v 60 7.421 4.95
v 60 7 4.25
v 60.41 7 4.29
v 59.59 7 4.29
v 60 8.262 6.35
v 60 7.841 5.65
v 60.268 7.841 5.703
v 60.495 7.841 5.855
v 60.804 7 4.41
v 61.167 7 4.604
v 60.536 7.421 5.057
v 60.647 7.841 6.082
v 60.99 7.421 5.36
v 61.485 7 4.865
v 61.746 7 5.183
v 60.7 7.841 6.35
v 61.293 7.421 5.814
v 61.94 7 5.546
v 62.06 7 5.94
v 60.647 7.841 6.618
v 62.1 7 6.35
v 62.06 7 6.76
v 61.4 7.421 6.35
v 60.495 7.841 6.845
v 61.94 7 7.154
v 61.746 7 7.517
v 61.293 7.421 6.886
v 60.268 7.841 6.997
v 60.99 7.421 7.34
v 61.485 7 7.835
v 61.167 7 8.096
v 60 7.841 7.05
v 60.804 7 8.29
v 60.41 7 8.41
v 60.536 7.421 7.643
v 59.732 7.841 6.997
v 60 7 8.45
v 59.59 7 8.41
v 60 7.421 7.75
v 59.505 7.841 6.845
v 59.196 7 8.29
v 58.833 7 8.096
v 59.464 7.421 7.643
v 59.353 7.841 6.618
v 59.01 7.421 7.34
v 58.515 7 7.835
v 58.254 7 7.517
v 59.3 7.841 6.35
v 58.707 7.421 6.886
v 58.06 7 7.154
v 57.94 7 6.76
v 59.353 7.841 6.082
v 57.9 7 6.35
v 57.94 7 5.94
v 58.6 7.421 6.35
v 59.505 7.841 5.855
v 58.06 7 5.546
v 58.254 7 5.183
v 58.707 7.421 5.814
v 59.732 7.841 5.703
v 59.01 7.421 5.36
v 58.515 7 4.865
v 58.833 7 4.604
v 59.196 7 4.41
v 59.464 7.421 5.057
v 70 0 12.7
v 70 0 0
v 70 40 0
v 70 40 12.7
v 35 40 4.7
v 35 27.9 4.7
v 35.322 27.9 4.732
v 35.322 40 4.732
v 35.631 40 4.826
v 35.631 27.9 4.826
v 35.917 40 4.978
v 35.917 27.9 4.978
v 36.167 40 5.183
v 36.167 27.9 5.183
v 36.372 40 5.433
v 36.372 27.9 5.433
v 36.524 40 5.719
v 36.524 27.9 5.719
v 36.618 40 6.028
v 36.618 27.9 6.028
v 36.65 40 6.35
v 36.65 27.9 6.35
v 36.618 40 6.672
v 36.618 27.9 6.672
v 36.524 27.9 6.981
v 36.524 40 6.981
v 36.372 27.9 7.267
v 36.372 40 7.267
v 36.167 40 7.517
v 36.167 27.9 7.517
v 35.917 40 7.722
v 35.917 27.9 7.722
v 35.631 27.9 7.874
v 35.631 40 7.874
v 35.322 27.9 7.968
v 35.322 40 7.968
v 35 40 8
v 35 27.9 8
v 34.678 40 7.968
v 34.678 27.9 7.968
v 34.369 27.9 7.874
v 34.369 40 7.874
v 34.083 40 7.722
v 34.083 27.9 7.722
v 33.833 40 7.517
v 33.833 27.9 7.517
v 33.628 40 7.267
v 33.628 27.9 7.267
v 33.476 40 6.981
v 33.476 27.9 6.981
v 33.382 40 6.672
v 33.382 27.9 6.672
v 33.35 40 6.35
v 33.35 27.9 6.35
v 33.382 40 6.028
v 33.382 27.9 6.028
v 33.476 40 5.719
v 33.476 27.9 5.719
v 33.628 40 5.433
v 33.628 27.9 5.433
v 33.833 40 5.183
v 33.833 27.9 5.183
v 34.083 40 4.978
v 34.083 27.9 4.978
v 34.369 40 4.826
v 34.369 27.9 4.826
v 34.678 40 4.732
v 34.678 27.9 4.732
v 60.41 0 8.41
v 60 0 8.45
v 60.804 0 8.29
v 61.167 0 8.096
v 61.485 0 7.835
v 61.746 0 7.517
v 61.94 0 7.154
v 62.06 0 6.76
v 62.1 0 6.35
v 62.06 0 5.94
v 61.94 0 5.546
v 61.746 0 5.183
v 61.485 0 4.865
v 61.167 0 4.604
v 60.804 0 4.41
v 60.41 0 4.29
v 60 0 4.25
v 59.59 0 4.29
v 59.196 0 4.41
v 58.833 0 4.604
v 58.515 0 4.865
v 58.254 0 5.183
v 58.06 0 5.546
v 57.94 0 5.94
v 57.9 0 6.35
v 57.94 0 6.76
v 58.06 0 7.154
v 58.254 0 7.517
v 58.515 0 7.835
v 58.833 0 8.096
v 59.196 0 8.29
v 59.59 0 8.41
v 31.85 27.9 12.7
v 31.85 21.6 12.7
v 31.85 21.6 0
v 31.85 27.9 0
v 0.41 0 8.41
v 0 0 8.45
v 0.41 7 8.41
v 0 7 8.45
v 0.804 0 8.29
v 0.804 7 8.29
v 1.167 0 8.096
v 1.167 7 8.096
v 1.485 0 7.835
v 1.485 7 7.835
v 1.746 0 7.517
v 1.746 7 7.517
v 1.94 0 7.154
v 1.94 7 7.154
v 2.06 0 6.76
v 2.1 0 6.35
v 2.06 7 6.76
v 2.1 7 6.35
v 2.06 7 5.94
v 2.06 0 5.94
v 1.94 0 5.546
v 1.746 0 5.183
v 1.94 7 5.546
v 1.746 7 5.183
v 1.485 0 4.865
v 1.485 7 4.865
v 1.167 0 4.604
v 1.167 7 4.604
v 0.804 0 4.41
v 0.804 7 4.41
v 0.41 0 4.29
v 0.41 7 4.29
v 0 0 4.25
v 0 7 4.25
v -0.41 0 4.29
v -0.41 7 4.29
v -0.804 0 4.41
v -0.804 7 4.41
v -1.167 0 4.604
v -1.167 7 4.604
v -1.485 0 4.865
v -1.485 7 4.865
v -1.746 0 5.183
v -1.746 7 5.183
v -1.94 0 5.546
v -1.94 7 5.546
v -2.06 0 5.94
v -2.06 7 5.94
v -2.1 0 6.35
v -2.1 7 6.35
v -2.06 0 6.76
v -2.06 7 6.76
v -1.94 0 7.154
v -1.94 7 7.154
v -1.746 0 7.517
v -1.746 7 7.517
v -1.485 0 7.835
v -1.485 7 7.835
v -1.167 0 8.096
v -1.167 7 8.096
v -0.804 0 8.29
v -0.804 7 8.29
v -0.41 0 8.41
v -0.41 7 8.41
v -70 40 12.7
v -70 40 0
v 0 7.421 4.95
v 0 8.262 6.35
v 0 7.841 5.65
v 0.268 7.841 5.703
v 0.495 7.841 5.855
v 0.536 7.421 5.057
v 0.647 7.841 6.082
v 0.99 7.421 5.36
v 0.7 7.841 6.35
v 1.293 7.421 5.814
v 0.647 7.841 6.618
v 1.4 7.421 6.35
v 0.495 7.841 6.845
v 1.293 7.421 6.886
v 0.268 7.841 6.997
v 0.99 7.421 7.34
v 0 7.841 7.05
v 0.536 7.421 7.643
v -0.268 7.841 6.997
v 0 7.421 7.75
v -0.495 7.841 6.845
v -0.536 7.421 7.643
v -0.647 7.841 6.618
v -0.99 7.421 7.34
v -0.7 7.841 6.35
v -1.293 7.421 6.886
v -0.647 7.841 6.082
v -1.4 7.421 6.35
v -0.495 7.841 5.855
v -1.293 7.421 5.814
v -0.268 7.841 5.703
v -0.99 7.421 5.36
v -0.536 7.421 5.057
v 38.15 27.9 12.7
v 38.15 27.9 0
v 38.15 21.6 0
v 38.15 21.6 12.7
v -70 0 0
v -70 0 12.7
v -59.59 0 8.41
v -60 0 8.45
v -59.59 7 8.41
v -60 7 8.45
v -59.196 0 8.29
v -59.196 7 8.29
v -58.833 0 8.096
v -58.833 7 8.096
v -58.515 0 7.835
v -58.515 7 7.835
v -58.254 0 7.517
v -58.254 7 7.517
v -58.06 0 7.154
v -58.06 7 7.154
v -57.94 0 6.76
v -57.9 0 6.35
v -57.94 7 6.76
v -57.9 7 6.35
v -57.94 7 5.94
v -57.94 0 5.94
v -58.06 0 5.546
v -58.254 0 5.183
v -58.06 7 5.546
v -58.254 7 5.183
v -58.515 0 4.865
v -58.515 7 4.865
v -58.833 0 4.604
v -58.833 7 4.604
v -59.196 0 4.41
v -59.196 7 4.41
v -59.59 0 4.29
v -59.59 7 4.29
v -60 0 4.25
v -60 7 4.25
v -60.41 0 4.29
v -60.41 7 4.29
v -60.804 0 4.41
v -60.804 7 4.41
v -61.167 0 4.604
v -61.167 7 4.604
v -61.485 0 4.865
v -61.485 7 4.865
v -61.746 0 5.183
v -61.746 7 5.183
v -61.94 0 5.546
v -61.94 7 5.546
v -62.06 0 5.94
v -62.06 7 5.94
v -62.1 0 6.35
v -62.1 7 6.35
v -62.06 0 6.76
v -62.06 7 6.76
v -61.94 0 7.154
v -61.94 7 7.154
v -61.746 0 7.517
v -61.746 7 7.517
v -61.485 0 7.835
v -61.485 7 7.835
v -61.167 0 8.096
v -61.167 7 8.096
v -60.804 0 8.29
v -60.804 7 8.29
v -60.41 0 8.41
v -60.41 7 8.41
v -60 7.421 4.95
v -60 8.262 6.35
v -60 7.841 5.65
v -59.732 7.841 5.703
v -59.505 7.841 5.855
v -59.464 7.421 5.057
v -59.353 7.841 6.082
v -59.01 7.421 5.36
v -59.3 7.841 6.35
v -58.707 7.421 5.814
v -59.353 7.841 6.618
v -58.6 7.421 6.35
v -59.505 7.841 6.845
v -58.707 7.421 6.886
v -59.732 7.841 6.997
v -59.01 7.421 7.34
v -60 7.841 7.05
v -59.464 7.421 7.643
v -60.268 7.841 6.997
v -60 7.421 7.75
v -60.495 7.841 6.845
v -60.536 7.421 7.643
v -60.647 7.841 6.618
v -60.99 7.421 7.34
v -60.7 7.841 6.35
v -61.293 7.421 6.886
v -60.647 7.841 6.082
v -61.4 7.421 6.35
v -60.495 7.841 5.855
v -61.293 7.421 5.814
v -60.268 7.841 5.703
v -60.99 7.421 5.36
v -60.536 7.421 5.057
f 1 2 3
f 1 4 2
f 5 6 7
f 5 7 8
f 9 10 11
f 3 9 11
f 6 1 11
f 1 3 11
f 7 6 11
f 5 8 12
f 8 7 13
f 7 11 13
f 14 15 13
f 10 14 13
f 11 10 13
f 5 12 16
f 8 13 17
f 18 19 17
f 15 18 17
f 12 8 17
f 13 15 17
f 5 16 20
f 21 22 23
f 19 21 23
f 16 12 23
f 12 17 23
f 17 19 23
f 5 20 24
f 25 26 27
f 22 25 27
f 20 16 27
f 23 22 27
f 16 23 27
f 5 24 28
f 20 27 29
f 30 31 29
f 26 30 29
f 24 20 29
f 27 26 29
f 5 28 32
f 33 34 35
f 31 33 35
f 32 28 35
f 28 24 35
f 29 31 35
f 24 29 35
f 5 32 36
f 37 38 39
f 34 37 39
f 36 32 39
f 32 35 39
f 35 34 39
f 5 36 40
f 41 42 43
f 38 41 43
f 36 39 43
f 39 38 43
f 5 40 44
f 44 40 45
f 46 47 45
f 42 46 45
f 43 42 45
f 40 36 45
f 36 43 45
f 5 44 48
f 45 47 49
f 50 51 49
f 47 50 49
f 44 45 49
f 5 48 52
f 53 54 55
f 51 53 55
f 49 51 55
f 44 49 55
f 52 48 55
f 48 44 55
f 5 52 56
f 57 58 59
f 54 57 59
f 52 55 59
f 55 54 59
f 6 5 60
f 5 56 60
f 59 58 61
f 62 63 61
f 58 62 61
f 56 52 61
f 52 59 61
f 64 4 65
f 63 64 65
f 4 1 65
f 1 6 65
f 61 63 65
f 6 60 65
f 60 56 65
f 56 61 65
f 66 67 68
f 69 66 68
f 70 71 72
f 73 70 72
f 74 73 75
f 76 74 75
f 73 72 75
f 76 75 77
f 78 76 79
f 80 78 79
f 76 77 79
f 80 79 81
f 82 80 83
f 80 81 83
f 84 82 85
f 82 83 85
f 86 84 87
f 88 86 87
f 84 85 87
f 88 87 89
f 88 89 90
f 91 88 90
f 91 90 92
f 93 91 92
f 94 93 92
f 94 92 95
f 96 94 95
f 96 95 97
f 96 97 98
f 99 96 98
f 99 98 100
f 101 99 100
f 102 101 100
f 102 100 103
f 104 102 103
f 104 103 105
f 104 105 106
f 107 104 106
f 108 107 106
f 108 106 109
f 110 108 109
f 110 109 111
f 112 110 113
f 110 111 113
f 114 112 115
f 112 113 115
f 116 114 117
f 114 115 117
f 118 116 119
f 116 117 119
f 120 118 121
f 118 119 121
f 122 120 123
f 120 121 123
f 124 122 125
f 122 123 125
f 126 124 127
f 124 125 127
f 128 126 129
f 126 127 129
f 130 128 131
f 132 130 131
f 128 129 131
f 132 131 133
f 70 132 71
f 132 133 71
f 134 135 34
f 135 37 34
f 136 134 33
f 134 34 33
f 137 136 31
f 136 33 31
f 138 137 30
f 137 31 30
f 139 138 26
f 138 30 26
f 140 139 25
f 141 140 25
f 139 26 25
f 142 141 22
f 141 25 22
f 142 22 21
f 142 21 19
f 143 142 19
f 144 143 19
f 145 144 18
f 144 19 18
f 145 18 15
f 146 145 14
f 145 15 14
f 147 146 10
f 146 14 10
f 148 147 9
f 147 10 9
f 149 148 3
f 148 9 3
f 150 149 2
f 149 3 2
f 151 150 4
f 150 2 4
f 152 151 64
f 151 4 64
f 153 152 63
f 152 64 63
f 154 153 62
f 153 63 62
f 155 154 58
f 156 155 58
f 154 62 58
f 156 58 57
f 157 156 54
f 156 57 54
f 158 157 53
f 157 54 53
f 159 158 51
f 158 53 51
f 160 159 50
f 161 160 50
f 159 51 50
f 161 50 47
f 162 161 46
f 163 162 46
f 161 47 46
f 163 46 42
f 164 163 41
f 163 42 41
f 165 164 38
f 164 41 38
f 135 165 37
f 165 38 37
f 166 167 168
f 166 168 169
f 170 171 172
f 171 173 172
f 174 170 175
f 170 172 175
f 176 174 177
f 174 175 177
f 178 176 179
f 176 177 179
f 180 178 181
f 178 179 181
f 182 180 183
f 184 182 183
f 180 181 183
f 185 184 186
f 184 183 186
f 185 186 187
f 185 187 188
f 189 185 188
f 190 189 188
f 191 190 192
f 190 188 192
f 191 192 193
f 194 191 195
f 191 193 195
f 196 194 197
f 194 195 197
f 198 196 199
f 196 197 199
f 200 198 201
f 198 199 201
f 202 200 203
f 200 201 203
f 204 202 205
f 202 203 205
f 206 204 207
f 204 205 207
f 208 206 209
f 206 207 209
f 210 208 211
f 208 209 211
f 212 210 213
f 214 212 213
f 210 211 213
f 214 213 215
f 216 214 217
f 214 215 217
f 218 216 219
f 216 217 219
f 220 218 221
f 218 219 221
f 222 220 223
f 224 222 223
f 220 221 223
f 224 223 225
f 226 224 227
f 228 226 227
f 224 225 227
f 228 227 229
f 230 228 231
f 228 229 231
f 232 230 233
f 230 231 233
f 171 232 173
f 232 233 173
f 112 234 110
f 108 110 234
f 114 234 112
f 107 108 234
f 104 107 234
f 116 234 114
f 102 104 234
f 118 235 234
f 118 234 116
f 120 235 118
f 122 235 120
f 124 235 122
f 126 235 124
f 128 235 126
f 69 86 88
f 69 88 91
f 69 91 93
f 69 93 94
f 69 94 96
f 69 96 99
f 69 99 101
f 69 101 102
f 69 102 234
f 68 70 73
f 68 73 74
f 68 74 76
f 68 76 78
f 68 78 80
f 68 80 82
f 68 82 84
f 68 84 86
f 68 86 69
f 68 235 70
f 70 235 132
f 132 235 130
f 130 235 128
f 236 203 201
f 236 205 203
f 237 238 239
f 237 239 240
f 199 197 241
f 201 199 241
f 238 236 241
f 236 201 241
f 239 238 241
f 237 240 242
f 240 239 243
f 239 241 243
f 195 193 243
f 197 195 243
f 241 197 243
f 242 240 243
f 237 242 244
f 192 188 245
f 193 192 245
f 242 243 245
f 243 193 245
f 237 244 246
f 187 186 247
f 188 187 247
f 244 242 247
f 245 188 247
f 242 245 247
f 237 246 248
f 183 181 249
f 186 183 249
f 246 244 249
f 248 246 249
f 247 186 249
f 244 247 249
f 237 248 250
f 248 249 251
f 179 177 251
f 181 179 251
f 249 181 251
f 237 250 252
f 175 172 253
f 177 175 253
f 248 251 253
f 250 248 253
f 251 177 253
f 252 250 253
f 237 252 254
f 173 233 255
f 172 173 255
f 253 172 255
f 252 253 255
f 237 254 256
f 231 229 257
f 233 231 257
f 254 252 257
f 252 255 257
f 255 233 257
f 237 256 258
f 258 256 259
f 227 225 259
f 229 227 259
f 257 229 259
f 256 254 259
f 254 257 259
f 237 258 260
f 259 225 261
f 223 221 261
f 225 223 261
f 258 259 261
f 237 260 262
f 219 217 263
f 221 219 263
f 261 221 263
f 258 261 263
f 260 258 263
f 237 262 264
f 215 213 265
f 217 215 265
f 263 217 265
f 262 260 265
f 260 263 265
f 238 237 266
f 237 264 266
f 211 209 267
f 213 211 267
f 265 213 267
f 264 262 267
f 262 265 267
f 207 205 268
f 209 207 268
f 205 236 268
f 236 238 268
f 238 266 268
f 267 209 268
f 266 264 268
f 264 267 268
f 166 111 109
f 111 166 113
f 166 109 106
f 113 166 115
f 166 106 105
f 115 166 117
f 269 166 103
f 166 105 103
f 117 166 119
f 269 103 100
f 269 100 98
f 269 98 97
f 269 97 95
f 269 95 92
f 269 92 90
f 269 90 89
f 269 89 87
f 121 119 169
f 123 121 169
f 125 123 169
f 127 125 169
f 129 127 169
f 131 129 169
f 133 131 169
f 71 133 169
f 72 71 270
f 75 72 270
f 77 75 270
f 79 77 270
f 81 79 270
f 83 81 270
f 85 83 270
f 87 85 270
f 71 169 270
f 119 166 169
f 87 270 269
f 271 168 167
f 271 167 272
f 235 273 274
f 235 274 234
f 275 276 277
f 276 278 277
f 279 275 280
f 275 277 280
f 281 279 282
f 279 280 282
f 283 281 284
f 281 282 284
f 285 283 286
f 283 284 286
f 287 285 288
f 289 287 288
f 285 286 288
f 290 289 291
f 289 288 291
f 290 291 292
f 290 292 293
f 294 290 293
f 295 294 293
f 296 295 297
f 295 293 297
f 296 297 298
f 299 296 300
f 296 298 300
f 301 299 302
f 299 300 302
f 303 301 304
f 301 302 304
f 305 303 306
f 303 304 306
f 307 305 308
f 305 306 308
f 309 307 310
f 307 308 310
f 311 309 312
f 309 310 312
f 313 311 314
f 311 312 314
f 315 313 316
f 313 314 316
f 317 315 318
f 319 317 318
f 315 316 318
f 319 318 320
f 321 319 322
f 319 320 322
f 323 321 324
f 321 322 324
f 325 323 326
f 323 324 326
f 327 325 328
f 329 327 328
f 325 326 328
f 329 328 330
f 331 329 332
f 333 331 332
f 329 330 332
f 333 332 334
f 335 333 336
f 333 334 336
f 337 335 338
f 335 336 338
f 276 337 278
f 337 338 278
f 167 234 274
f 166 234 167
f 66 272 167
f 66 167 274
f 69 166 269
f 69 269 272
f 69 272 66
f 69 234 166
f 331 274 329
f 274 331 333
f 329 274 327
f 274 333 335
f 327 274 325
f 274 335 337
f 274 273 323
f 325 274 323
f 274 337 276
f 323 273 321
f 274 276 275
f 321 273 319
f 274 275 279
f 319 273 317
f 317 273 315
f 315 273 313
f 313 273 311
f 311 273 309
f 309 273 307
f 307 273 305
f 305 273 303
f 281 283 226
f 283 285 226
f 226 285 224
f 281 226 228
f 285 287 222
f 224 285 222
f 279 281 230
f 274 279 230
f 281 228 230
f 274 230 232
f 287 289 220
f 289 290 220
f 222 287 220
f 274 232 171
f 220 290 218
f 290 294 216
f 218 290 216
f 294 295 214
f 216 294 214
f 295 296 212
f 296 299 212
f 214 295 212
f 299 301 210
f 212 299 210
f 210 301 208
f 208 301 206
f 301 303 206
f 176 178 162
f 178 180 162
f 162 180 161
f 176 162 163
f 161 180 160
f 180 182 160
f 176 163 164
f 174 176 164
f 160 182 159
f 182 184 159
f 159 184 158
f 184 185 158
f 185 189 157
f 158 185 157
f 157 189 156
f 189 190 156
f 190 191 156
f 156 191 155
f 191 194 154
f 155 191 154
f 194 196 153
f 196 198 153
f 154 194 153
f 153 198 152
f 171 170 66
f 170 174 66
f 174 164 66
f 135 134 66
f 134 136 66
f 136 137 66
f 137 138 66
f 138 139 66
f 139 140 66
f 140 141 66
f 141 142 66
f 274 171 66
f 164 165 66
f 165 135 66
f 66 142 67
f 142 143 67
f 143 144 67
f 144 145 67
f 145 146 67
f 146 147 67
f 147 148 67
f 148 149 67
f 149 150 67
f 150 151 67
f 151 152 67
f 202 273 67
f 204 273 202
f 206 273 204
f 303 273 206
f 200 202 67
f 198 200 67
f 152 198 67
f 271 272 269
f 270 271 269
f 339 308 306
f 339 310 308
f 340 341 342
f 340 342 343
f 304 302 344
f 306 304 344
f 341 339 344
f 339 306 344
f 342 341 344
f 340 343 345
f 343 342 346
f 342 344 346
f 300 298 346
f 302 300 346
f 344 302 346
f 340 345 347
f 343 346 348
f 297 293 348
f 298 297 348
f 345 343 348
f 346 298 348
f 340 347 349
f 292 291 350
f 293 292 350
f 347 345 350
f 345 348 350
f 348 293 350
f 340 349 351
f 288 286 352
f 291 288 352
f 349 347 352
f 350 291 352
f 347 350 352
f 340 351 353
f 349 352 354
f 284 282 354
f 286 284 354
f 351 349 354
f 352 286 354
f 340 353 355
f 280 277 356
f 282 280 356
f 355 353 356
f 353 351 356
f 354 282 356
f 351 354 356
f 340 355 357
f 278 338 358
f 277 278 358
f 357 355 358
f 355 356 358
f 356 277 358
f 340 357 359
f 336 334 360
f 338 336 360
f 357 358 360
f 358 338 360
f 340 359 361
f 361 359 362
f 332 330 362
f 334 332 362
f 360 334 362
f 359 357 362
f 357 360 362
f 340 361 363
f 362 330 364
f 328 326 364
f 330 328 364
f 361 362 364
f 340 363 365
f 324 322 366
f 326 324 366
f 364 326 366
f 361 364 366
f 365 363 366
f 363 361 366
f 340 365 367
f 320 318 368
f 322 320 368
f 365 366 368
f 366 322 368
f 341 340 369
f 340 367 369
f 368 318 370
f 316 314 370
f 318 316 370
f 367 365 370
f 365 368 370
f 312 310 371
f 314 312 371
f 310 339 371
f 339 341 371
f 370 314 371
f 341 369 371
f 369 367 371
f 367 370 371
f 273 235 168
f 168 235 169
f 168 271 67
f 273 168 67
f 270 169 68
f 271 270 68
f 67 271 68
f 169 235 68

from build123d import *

# Parameters (mm, degrees)
SKETCH1_W                       = 140
SKETCH1_H                       = 40
SKETCH1_W_2                     = 6.3
SKETCH1_H_2                     = 6.3
BOSS_EXTRUDE1_DEPTH             = 12.7
TAP_DRILL_FOR_M4X0_7_TAP1_D     = 3.3
TAP_DRILL_FOR_M4X0_7_TAP1_DEPTH = 12.1
TAP_DRILL_FOR_M5X0_8_TAP2_D     = 4.2
TAP_DRILL_FOR_M5X0_8_TAP2_DEPTH = 7
TAP_DRILL_FOR_M5X0_8_TAP2_TIP   = 1.2618073


with BuildPart() as part:
    # Sketch1 → Boss-Extrude1 (new body)
    with BuildSketch(Plane.XY):
        with Locations((0, 20)):
            Rectangle(SKETCH1_W, SKETCH1_H)
        with Locations((35, 24.75)):
            Rectangle(SKETCH1_W_2, SKETCH1_H_2, mode=Mode.SUBTRACT)
    extrude(amount=BOSS_EXTRUDE1_DEPTH)

    # Tap Drill for M4x0.7 Tap1
    with Locations(Plane(origin=(35, 40, 6.35), x_dir=(0, 0, 1), z_dir=(0, 1, 0))):
        with Locations((0, 0)):
            Hole(TAP_DRILL_FOR_M4X0_7_TAP1_D / 2, depth=TAP_DRILL_FOR_M4X0_7_TAP1_DEPTH)

    # Tap Drill for M5x0.8 Tap2
    with Locations(Plane(origin=(-60, 0, 6.35), x_dir=(0, 0, -1), z_dir=(0, -1, 0))):
        with Locations((0, 0), (0, 60), (0, 120)):
            Hole(TAP_DRILL_FOR_M5X0_8_TAP2_D / 2, depth=TAP_DRILL_FOR_M5X0_8_TAP2_DEPTH)
            with Locations((0, 0, -(TAP_DRILL_FOR_M5X0_8_TAP2_DEPTH + TAP_DRILL_FOR_M5X0_8_TAP2_TIP / 2))):  # 118° drill point
                Cone(0, TAP_DRILL_FOR_M5X0_8_TAP2_D / 2, TAP_DRILL_FOR_M5X0_8_TAP2_TIP, mode=Mode.SUBTRACT)


solid = part.part
